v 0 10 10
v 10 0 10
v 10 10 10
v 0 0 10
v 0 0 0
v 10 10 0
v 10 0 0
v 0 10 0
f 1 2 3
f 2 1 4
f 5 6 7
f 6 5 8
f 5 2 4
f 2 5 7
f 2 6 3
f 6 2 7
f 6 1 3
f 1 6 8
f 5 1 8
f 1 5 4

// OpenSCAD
// Generated by SolidPython 1.1.3 on 2023-05-27 12:03:14


cube(size = 10);
/***********************************************
*********      SolidPython code:      **********
************************************************
 
from solid import *
from solid.utils import *
import pathlib


def main():
    c = cube(10)

    scad_render_to_file(c, pathlib.Path(__file__).parent / 'cube.scad')


if __name__ == '__main__':
    main()
 
 
************************************************/
